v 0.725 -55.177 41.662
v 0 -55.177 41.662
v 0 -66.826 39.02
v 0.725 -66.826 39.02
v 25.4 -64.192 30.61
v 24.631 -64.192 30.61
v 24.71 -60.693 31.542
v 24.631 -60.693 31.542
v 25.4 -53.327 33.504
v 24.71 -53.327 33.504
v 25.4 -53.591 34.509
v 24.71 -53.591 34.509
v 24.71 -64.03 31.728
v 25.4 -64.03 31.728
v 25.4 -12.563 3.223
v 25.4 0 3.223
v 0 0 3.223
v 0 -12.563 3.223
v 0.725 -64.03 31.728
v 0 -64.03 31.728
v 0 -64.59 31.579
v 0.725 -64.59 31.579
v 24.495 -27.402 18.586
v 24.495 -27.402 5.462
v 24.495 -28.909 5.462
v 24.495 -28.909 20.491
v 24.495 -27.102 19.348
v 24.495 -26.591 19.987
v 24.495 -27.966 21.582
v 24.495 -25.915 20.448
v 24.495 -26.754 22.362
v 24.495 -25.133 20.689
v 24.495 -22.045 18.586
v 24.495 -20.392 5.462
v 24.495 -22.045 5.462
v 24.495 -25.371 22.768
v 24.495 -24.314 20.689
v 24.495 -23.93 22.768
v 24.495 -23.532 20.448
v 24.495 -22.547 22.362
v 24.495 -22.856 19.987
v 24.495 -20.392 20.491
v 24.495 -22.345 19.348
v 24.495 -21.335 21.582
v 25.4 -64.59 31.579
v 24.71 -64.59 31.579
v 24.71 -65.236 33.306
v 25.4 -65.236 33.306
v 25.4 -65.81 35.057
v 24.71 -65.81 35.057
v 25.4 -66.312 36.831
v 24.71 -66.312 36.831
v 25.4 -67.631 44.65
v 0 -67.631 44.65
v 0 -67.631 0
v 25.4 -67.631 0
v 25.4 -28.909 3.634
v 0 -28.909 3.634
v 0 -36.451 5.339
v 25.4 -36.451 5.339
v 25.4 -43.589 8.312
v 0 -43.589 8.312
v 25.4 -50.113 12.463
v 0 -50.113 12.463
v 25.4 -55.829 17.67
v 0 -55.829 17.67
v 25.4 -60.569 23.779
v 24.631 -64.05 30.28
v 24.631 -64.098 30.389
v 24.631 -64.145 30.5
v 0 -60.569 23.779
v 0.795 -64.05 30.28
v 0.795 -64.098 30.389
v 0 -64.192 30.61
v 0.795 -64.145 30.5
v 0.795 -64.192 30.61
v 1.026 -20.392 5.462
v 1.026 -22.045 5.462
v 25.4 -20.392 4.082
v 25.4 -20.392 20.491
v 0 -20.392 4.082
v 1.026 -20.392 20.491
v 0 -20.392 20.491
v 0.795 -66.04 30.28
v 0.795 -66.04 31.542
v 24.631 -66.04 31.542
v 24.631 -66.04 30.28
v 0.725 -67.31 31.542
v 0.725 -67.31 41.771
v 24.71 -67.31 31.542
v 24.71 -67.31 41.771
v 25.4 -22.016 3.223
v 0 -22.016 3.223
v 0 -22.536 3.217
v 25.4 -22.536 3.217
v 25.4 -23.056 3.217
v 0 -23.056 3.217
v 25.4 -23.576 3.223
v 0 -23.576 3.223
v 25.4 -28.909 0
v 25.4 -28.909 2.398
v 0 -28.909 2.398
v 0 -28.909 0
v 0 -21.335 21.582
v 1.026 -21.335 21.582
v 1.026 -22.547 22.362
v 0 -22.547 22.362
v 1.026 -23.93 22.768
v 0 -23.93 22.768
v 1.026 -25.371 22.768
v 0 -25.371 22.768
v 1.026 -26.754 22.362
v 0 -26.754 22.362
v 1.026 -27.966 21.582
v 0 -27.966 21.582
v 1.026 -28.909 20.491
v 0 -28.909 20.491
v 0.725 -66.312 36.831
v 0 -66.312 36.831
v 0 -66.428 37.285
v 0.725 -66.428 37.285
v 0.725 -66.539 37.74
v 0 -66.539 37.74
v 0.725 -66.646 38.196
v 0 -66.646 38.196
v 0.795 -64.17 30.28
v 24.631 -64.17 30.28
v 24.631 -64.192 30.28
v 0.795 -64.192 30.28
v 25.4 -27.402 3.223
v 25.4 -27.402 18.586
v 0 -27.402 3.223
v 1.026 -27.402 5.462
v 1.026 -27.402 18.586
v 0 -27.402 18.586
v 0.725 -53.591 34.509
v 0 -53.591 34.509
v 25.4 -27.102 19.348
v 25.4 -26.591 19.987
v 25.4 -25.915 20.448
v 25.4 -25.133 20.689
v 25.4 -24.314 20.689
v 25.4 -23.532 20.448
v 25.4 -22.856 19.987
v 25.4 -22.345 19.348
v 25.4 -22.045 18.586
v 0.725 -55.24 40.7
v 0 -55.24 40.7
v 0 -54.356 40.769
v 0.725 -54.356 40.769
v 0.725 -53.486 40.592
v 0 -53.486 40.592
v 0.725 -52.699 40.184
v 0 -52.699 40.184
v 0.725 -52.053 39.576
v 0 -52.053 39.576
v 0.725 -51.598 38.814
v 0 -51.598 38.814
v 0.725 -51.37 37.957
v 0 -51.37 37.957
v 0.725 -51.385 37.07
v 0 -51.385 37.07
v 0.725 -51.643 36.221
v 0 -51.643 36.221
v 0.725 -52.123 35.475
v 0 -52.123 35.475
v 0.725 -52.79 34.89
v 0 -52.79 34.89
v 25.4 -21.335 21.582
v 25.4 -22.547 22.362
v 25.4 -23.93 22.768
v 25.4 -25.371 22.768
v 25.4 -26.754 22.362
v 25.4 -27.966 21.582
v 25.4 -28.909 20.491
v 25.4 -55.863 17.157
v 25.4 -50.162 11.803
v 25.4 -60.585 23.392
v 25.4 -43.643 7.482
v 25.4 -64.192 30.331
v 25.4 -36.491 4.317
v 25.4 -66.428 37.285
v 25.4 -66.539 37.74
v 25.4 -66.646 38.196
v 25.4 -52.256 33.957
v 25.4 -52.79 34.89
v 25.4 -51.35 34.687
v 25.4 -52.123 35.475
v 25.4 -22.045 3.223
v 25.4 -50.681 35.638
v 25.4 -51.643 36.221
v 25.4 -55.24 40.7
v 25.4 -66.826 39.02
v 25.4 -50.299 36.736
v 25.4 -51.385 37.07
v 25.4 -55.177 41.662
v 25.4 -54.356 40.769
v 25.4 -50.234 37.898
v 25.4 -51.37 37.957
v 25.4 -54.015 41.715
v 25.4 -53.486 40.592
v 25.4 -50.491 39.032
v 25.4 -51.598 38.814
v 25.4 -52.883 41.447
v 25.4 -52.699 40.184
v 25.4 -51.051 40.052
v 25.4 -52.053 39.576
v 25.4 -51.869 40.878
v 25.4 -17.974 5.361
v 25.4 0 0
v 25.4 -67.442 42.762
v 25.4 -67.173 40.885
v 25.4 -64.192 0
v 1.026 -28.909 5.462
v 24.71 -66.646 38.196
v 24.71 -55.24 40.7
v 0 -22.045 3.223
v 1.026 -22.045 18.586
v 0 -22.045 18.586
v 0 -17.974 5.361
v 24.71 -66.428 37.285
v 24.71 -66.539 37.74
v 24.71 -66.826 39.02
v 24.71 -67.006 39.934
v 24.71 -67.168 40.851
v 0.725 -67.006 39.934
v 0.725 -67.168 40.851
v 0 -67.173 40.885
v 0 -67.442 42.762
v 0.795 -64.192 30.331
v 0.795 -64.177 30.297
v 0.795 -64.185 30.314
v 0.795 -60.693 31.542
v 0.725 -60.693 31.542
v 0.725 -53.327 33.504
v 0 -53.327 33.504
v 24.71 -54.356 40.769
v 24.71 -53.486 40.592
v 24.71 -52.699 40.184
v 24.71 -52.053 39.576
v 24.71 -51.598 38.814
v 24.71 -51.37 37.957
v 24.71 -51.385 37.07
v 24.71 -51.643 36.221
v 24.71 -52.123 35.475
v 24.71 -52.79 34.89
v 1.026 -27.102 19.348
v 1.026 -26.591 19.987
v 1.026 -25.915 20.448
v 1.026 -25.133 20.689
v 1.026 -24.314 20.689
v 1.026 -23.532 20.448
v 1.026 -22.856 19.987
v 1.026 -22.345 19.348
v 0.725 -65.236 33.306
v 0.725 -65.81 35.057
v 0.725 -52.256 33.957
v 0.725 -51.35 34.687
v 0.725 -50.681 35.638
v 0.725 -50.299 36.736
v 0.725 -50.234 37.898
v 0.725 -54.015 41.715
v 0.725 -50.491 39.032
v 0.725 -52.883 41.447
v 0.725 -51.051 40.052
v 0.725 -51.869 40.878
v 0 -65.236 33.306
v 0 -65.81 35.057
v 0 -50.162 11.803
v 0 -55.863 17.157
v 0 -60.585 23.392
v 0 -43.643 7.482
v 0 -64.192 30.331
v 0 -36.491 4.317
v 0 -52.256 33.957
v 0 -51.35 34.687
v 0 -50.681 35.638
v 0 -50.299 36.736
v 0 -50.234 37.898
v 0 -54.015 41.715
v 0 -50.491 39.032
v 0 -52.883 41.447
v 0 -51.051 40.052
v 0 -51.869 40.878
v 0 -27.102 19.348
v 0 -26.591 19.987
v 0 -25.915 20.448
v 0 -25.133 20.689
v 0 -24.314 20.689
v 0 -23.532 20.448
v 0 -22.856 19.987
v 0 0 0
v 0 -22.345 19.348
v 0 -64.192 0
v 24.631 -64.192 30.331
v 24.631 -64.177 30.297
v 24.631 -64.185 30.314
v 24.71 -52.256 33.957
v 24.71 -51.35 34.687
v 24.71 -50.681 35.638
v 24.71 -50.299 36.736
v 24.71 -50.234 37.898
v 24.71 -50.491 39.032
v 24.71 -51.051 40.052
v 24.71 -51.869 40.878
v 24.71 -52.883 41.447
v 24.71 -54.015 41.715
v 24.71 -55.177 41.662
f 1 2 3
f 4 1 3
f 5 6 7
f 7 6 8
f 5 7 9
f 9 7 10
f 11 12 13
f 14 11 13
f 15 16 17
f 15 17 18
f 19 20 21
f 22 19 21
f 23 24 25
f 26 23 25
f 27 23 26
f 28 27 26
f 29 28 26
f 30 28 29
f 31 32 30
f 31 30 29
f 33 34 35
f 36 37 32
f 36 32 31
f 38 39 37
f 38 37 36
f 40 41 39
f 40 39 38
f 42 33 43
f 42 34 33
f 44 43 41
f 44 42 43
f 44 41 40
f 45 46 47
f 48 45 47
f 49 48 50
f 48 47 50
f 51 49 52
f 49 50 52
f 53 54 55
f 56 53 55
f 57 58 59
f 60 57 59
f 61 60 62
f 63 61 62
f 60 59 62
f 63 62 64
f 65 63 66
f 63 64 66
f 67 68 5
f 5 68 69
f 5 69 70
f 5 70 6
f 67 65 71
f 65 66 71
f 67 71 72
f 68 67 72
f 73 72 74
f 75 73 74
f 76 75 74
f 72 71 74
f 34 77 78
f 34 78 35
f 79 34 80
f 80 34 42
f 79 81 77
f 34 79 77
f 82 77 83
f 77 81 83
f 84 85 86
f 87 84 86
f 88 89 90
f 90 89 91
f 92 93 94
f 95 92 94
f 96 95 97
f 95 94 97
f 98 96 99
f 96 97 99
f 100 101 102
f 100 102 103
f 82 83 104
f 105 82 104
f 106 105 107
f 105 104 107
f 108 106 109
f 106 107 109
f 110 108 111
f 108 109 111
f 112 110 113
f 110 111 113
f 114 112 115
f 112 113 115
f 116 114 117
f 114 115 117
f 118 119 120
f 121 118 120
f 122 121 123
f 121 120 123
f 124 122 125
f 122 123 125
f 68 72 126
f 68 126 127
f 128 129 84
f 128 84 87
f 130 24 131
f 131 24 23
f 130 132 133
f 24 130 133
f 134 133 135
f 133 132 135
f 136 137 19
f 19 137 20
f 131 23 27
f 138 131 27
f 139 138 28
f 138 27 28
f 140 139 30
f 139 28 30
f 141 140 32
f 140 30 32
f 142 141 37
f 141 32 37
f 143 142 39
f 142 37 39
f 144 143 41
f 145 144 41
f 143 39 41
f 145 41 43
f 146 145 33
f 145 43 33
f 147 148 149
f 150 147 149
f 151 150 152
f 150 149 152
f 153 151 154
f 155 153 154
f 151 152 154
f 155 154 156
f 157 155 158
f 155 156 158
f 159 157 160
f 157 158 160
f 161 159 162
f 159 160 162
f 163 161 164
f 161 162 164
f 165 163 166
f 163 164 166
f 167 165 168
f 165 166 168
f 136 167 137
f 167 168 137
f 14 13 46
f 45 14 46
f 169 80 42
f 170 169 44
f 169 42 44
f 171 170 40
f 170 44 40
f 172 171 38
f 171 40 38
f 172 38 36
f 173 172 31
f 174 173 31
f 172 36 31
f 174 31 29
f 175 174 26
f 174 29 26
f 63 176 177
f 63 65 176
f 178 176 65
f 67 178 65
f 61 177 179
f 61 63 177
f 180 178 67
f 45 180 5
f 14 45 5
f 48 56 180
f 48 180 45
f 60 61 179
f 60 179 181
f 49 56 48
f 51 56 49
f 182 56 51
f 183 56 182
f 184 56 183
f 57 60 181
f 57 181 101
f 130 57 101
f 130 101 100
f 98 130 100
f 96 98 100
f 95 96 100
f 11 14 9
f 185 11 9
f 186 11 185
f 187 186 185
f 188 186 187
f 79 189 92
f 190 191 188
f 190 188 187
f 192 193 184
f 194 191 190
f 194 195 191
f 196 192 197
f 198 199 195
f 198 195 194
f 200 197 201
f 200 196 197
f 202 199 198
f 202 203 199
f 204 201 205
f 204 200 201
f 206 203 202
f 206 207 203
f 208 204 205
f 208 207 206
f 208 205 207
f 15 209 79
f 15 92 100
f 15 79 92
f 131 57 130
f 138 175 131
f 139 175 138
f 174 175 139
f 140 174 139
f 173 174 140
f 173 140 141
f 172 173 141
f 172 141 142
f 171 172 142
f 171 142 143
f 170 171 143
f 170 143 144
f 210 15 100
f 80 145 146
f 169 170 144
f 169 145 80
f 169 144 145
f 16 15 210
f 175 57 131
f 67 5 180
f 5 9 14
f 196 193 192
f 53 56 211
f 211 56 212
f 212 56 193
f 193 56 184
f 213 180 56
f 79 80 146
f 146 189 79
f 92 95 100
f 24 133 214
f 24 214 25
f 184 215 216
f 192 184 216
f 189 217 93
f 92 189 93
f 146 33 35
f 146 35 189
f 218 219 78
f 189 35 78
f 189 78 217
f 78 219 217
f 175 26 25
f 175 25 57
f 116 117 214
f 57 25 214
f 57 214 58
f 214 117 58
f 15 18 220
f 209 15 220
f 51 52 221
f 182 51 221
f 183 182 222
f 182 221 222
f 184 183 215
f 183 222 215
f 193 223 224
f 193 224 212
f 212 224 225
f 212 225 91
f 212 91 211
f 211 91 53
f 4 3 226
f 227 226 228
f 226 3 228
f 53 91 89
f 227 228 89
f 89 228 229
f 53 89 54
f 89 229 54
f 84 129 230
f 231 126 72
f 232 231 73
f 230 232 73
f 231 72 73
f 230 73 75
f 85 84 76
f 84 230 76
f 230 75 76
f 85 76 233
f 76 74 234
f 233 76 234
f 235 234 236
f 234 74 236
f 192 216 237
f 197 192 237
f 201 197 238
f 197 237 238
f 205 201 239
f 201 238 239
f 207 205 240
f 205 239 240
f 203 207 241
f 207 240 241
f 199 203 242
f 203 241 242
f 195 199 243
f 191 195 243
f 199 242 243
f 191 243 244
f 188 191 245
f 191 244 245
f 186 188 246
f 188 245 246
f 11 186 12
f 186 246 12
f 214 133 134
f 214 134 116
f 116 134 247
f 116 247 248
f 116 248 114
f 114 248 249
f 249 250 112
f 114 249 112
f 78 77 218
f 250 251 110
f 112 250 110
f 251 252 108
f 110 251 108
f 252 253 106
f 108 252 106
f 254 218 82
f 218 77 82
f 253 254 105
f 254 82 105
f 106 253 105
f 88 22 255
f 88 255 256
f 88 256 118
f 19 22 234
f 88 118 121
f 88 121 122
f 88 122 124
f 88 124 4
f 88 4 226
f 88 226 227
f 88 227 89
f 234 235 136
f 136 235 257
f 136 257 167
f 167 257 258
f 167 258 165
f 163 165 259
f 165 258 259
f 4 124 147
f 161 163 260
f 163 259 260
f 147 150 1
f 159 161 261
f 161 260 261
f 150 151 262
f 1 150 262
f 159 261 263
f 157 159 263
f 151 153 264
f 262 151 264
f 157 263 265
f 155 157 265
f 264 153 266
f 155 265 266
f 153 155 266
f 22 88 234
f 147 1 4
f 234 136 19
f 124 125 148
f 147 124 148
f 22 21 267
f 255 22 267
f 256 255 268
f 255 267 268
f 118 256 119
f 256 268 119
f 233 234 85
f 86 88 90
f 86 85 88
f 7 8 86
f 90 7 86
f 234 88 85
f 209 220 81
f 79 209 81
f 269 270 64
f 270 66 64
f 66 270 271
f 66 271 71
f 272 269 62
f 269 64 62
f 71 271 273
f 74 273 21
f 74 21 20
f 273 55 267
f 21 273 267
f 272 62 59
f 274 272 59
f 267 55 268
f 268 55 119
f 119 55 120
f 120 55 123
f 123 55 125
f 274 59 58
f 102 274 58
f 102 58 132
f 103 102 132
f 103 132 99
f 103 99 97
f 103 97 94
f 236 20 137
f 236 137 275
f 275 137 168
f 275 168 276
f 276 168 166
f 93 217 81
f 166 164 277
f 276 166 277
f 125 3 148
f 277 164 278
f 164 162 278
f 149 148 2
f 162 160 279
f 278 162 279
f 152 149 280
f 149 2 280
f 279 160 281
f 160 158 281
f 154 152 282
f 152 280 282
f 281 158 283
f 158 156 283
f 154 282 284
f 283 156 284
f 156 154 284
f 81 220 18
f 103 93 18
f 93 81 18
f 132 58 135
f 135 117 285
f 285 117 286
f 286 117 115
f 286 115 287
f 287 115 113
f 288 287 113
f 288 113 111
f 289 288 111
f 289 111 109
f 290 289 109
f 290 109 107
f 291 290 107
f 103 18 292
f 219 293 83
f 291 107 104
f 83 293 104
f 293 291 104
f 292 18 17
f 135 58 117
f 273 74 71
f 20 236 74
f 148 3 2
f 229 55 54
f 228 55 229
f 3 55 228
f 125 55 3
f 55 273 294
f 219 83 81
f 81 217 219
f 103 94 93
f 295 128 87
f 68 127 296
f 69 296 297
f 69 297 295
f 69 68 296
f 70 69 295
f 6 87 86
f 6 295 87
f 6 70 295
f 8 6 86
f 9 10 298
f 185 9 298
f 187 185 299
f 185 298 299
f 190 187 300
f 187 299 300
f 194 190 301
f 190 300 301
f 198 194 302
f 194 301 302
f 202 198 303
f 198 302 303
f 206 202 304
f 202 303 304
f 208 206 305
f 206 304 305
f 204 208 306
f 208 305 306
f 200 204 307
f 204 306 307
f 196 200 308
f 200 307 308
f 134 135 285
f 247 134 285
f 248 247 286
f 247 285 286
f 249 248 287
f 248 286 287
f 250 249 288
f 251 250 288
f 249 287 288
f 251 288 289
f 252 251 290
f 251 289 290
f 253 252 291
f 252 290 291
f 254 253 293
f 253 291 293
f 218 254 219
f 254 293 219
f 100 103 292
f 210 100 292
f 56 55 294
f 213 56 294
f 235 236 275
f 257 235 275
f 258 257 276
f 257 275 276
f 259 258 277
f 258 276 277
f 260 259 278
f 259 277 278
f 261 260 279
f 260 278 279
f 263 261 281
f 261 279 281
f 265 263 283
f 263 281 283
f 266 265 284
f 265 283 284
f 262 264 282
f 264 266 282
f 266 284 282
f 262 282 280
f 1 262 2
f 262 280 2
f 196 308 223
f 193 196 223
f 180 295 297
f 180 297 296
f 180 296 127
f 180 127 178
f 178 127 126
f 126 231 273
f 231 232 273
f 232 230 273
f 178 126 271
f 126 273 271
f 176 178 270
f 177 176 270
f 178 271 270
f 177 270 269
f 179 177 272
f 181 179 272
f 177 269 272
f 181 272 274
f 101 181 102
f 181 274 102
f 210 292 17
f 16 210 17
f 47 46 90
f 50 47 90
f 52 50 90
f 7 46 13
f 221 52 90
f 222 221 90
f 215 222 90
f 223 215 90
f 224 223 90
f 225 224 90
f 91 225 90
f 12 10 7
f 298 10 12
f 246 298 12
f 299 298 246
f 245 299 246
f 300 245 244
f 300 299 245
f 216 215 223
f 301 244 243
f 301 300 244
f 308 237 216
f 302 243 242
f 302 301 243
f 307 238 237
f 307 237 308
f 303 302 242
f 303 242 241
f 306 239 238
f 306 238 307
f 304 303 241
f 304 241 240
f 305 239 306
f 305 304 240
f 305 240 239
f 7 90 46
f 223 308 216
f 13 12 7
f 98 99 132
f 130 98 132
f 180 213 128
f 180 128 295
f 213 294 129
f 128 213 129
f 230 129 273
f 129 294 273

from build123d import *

# Parameters (mm, degrees)
F1_DEPTH = 25.4
F2_W     = 23.985484906
F2_H     = 10.9293945134
F3_DEPTH = 63.5
F4_DEPTH = 67.31
F5_W     = 23.835350119
F5_H     = 2.447379753
F6_DEPTH = 66.04
F7_W     = 23.4697095584
F7_H     = 17.8560893983
F8_DEPTH = 34.29


# Not quite as in the source:
# - the program builds the solid bodies; features that only make, move or delete a surface that nothing else refers to are left out


with BuildPart() as f1:
    # F0 (on Right) → F1 (new body)
    with BuildSketch(Plane.YZ):
        Polygon((0, 0), (0, 3.2231518999), (-12.5630013645, 3.2231518999), (-20.3921347857, 3.2231518999), (-20.3921347857, 0), align=None)
        Polygon((-20.3921347857, 3.2231518999), (-12.5630013645, 3.2231518999), (-17.9742891341, 5.361024756), (-20.3921347857, 4.0822205165), align=None)
        with BuildLine():
            Line((-20.3921347857, 0), (-20.3921347857, 3.2231518999))
            Line((-20.3921347857, 3.2231518999), (-22.0163828564, 3.2231518999))
            ThreePointArc((-22.0163828564, 3.2231518999), (-22.7959834692, 3.2163945029), (-23.575584082, 3.2231518999))
            Line((-23.575584082, 3.2231518999), (-27.4015981704, 3.2231518999))
            Line((-27.4015981704, 3.2231518999), (-28.9092455059, 3.2231518999))
            Line((-28.9092455059, 3.2231518999), (-28.9092455059, 2.3980058104))
            Line((-28.9092455059, 2.3980058104), (-28.9092455059, 0))
            Line((-28.9092455059, 0), (-20.3921347857, 0))
        make_face()
        Polygon((-22.0163828564, 3.2231518999), (-20.3921347857, 3.2231518999), (-20.3921347857, 4.0822205165), align=None)
        with BuildLine():
            Line((-22.0454800874, 3.2231518999), (-22.0163828564, 3.2231518999))
            Line((-22.0163828564, 3.2231518999), (-20.3921347857, 4.0822205165))
            Line((-20.3921347857, 4.0822205165), (-20.3921347857, 20.491162315))
            ThreePointArc((-20.3921347857, 20.491162315), (-24.6506901458, 22.8198511271), (-28.9092455059, 20.491162315))
            Line((-28.9092455059, 20.491162315), (-28.9092455059, 3.6338099802))
            ThreePointArc((-28.9092455059, 3.6338099802), (-28.1561856735, 3.5369589297), (-27.4015981704, 3.4528343954))
            Line((-27.4015981704, 3.4528343954), (-27.4015981704, 18.5859873891))
            ThreePointArc((-27.4015981704, 18.5859873891), (-24.7235391289, 20.7198764309), (-22.0454800874, 18.5859873891))
            Line((-22.0454800874, 18.5859873891), (-22.0454800874, 3.2231518999))
        make_face()
        with BuildLine():
            ThreePointArc((-64.1917986715, 30.3313969183), (-50.16224019, 11.8027548597), (-28.9092455059, 2.3980058104))
            Line((-28.9092455059, 2.3980058104), (-28.9092455059, 3.2231518999))
            Line((-28.9092455059, 3.2231518999), (-28.9092455059, 3.6338099802))
            ThreePointArc((-28.9092455059, 3.6338099802), (-50.1126919116, 12.4626789581), (-64.1917986715, 30.6096847649))
            Line((-64.1917986715, 30.6096847649), (-64.1917986715, 30.3313969183))
        make_face()
        with BuildLine():
            Line((-28.9092455059, 3.2231518999), (-27.4015981704, 3.2231518999))
            Line((-27.4015981704, 3.2231518999), (-27.4015981704, 3.4528343954))
            ThreePointArc((-27.4015981704, 3.4528343954), (-28.1561856735, 3.5369589297), (-28.9092455059, 3.6338099802))
            Line((-28.9092455059, 3.6338099802), (-28.9092455059, 3.2231518999))
        make_face()
        with BuildLine():
            ThreePointArc((-67.6309564566, 44.6495479383), (-66.4828080231, 37.35321731), (-64.1917986715, 30.3313969183))
            Line((-64.1917986715, 30.3313969183), (-64.1917986715, 30.6096847649))
            ThreePointArc((-64.1917986715, 30.6096847649), (-64.3937854186, 31.0930746092), (-64.59012772, 31.5787844899))
            ThreePointArc((-64.59012772, 31.5787844899), (-65.5320044676, 34.1785482504), (-66.3123383407, 36.8312793835))
            ThreePointArc((-66.3123383407, 36.8312793835), (-66.4844767509, 37.5124245346), (-66.645954144, 38.1961755131))
            ThreePointArc((-66.645954144, 38.1961755131), (-66.7377613235, 38.6078575578), (-66.8257035474, 39.0203825019))
            ThreePointArc((-66.8257035474, 39.0203825019), (-67.3173861233, 41.8222257294), (-67.6309564566, 44.6495479383))
        make_face()
        with BuildLine():
            Line((-64.1917986715, 0), (-64.1917986715, 30.3313969183))
            ThreePointArc((-64.1917986715, 30.3313969183), (-66.4828080231, 37.35321731), (-67.6309564566, 44.6495479383))
            Line((-67.6309564566, 44.6495479383), (-67.6309564566, 0))
            Line((-67.6309564566, 0), (-64.1917986715, 0))
        make_face()
        with BuildLine():
            ThreePointArc((-64.59012772, 31.5787844899), (-64.3937854186, 31.0930746092), (-64.1917986715, 30.6096847649))
            Line((-64.1917986715, 30.6096847649), (-64.0304028831, 31.7278995465))
            Line((-64.0304028831, 31.7278995465), (-64.59012772, 31.5787844899))
        make_face()
        with BuildLine():
            Line((-64.0304028831, 31.7278995465), (-64.1917986715, 30.6096847649))
            Line((-64.1917986715, 30.6096847649), (-53.3271447245, 33.5041132079))
            ThreePointArc((-53.3271447245, 33.5041132079), (-50.3228913796, 38.4738529349), (-55.1768802106, 41.6617430747))
            Line((-55.1768802106, 41.6617430747), (-66.8257035474, 39.0203825019))
            ThreePointArc((-66.8257035474, 39.0203825019), (-66.7377613235, 38.6078575578), (-66.645954144, 38.1961755131))
            Line((-66.645954144, 38.1961755131), (-55.2403122474, 40.7000877275))
            ThreePointArc((-55.2403122474, 40.7000877275), (-51.4541715224, 38.3935253272), (-53.5909704186, 34.5090456743))
            Line((-53.5909704186, 34.5090456743), (-64.0304028831, 31.7278995465))
        make_face()
    extrude(amount=F1_DEPTH)

    # F2 (on Front) → F3 (cut)
    with BuildSketch(Plane.XZ):
        with Locations((12.7173874935, 37.006566301)):
            Rectangle(F2_W, F2_H)
    extrude(amount=F3_DEPTH, mode=Mode.SUBTRACT)

    # F2 (on Front) → F4 (cut)
    with BuildSketch(Plane.XZ):
        with Locations((12.7173874935, 37.006566301)):
            Rectangle(F2_W, F2_H)
    extrude(amount=F4_DEPTH, mode=Mode.SUBTRACT)

    # F5 (on Front) → F6 (cut)
    with BuildSketch(Plane.XZ):
        with Locations((12.7131266927, 31.5032089129)):
            Rectangle(F5_W, F5_H)
    extrude(amount=F6_DEPTH, mode=Mode.SUBTRACT)

    # F7 (on Front) → F8 (cut)
    with BuildSketch(Plane.XZ):
        with Locations((12.7604022855, 14.3902720883)):
            Rectangle(F7_W, F7_H)
    extrude(amount=F8_DEPTH, mode=Mode.SUBTRACT)


solid = f1.part
